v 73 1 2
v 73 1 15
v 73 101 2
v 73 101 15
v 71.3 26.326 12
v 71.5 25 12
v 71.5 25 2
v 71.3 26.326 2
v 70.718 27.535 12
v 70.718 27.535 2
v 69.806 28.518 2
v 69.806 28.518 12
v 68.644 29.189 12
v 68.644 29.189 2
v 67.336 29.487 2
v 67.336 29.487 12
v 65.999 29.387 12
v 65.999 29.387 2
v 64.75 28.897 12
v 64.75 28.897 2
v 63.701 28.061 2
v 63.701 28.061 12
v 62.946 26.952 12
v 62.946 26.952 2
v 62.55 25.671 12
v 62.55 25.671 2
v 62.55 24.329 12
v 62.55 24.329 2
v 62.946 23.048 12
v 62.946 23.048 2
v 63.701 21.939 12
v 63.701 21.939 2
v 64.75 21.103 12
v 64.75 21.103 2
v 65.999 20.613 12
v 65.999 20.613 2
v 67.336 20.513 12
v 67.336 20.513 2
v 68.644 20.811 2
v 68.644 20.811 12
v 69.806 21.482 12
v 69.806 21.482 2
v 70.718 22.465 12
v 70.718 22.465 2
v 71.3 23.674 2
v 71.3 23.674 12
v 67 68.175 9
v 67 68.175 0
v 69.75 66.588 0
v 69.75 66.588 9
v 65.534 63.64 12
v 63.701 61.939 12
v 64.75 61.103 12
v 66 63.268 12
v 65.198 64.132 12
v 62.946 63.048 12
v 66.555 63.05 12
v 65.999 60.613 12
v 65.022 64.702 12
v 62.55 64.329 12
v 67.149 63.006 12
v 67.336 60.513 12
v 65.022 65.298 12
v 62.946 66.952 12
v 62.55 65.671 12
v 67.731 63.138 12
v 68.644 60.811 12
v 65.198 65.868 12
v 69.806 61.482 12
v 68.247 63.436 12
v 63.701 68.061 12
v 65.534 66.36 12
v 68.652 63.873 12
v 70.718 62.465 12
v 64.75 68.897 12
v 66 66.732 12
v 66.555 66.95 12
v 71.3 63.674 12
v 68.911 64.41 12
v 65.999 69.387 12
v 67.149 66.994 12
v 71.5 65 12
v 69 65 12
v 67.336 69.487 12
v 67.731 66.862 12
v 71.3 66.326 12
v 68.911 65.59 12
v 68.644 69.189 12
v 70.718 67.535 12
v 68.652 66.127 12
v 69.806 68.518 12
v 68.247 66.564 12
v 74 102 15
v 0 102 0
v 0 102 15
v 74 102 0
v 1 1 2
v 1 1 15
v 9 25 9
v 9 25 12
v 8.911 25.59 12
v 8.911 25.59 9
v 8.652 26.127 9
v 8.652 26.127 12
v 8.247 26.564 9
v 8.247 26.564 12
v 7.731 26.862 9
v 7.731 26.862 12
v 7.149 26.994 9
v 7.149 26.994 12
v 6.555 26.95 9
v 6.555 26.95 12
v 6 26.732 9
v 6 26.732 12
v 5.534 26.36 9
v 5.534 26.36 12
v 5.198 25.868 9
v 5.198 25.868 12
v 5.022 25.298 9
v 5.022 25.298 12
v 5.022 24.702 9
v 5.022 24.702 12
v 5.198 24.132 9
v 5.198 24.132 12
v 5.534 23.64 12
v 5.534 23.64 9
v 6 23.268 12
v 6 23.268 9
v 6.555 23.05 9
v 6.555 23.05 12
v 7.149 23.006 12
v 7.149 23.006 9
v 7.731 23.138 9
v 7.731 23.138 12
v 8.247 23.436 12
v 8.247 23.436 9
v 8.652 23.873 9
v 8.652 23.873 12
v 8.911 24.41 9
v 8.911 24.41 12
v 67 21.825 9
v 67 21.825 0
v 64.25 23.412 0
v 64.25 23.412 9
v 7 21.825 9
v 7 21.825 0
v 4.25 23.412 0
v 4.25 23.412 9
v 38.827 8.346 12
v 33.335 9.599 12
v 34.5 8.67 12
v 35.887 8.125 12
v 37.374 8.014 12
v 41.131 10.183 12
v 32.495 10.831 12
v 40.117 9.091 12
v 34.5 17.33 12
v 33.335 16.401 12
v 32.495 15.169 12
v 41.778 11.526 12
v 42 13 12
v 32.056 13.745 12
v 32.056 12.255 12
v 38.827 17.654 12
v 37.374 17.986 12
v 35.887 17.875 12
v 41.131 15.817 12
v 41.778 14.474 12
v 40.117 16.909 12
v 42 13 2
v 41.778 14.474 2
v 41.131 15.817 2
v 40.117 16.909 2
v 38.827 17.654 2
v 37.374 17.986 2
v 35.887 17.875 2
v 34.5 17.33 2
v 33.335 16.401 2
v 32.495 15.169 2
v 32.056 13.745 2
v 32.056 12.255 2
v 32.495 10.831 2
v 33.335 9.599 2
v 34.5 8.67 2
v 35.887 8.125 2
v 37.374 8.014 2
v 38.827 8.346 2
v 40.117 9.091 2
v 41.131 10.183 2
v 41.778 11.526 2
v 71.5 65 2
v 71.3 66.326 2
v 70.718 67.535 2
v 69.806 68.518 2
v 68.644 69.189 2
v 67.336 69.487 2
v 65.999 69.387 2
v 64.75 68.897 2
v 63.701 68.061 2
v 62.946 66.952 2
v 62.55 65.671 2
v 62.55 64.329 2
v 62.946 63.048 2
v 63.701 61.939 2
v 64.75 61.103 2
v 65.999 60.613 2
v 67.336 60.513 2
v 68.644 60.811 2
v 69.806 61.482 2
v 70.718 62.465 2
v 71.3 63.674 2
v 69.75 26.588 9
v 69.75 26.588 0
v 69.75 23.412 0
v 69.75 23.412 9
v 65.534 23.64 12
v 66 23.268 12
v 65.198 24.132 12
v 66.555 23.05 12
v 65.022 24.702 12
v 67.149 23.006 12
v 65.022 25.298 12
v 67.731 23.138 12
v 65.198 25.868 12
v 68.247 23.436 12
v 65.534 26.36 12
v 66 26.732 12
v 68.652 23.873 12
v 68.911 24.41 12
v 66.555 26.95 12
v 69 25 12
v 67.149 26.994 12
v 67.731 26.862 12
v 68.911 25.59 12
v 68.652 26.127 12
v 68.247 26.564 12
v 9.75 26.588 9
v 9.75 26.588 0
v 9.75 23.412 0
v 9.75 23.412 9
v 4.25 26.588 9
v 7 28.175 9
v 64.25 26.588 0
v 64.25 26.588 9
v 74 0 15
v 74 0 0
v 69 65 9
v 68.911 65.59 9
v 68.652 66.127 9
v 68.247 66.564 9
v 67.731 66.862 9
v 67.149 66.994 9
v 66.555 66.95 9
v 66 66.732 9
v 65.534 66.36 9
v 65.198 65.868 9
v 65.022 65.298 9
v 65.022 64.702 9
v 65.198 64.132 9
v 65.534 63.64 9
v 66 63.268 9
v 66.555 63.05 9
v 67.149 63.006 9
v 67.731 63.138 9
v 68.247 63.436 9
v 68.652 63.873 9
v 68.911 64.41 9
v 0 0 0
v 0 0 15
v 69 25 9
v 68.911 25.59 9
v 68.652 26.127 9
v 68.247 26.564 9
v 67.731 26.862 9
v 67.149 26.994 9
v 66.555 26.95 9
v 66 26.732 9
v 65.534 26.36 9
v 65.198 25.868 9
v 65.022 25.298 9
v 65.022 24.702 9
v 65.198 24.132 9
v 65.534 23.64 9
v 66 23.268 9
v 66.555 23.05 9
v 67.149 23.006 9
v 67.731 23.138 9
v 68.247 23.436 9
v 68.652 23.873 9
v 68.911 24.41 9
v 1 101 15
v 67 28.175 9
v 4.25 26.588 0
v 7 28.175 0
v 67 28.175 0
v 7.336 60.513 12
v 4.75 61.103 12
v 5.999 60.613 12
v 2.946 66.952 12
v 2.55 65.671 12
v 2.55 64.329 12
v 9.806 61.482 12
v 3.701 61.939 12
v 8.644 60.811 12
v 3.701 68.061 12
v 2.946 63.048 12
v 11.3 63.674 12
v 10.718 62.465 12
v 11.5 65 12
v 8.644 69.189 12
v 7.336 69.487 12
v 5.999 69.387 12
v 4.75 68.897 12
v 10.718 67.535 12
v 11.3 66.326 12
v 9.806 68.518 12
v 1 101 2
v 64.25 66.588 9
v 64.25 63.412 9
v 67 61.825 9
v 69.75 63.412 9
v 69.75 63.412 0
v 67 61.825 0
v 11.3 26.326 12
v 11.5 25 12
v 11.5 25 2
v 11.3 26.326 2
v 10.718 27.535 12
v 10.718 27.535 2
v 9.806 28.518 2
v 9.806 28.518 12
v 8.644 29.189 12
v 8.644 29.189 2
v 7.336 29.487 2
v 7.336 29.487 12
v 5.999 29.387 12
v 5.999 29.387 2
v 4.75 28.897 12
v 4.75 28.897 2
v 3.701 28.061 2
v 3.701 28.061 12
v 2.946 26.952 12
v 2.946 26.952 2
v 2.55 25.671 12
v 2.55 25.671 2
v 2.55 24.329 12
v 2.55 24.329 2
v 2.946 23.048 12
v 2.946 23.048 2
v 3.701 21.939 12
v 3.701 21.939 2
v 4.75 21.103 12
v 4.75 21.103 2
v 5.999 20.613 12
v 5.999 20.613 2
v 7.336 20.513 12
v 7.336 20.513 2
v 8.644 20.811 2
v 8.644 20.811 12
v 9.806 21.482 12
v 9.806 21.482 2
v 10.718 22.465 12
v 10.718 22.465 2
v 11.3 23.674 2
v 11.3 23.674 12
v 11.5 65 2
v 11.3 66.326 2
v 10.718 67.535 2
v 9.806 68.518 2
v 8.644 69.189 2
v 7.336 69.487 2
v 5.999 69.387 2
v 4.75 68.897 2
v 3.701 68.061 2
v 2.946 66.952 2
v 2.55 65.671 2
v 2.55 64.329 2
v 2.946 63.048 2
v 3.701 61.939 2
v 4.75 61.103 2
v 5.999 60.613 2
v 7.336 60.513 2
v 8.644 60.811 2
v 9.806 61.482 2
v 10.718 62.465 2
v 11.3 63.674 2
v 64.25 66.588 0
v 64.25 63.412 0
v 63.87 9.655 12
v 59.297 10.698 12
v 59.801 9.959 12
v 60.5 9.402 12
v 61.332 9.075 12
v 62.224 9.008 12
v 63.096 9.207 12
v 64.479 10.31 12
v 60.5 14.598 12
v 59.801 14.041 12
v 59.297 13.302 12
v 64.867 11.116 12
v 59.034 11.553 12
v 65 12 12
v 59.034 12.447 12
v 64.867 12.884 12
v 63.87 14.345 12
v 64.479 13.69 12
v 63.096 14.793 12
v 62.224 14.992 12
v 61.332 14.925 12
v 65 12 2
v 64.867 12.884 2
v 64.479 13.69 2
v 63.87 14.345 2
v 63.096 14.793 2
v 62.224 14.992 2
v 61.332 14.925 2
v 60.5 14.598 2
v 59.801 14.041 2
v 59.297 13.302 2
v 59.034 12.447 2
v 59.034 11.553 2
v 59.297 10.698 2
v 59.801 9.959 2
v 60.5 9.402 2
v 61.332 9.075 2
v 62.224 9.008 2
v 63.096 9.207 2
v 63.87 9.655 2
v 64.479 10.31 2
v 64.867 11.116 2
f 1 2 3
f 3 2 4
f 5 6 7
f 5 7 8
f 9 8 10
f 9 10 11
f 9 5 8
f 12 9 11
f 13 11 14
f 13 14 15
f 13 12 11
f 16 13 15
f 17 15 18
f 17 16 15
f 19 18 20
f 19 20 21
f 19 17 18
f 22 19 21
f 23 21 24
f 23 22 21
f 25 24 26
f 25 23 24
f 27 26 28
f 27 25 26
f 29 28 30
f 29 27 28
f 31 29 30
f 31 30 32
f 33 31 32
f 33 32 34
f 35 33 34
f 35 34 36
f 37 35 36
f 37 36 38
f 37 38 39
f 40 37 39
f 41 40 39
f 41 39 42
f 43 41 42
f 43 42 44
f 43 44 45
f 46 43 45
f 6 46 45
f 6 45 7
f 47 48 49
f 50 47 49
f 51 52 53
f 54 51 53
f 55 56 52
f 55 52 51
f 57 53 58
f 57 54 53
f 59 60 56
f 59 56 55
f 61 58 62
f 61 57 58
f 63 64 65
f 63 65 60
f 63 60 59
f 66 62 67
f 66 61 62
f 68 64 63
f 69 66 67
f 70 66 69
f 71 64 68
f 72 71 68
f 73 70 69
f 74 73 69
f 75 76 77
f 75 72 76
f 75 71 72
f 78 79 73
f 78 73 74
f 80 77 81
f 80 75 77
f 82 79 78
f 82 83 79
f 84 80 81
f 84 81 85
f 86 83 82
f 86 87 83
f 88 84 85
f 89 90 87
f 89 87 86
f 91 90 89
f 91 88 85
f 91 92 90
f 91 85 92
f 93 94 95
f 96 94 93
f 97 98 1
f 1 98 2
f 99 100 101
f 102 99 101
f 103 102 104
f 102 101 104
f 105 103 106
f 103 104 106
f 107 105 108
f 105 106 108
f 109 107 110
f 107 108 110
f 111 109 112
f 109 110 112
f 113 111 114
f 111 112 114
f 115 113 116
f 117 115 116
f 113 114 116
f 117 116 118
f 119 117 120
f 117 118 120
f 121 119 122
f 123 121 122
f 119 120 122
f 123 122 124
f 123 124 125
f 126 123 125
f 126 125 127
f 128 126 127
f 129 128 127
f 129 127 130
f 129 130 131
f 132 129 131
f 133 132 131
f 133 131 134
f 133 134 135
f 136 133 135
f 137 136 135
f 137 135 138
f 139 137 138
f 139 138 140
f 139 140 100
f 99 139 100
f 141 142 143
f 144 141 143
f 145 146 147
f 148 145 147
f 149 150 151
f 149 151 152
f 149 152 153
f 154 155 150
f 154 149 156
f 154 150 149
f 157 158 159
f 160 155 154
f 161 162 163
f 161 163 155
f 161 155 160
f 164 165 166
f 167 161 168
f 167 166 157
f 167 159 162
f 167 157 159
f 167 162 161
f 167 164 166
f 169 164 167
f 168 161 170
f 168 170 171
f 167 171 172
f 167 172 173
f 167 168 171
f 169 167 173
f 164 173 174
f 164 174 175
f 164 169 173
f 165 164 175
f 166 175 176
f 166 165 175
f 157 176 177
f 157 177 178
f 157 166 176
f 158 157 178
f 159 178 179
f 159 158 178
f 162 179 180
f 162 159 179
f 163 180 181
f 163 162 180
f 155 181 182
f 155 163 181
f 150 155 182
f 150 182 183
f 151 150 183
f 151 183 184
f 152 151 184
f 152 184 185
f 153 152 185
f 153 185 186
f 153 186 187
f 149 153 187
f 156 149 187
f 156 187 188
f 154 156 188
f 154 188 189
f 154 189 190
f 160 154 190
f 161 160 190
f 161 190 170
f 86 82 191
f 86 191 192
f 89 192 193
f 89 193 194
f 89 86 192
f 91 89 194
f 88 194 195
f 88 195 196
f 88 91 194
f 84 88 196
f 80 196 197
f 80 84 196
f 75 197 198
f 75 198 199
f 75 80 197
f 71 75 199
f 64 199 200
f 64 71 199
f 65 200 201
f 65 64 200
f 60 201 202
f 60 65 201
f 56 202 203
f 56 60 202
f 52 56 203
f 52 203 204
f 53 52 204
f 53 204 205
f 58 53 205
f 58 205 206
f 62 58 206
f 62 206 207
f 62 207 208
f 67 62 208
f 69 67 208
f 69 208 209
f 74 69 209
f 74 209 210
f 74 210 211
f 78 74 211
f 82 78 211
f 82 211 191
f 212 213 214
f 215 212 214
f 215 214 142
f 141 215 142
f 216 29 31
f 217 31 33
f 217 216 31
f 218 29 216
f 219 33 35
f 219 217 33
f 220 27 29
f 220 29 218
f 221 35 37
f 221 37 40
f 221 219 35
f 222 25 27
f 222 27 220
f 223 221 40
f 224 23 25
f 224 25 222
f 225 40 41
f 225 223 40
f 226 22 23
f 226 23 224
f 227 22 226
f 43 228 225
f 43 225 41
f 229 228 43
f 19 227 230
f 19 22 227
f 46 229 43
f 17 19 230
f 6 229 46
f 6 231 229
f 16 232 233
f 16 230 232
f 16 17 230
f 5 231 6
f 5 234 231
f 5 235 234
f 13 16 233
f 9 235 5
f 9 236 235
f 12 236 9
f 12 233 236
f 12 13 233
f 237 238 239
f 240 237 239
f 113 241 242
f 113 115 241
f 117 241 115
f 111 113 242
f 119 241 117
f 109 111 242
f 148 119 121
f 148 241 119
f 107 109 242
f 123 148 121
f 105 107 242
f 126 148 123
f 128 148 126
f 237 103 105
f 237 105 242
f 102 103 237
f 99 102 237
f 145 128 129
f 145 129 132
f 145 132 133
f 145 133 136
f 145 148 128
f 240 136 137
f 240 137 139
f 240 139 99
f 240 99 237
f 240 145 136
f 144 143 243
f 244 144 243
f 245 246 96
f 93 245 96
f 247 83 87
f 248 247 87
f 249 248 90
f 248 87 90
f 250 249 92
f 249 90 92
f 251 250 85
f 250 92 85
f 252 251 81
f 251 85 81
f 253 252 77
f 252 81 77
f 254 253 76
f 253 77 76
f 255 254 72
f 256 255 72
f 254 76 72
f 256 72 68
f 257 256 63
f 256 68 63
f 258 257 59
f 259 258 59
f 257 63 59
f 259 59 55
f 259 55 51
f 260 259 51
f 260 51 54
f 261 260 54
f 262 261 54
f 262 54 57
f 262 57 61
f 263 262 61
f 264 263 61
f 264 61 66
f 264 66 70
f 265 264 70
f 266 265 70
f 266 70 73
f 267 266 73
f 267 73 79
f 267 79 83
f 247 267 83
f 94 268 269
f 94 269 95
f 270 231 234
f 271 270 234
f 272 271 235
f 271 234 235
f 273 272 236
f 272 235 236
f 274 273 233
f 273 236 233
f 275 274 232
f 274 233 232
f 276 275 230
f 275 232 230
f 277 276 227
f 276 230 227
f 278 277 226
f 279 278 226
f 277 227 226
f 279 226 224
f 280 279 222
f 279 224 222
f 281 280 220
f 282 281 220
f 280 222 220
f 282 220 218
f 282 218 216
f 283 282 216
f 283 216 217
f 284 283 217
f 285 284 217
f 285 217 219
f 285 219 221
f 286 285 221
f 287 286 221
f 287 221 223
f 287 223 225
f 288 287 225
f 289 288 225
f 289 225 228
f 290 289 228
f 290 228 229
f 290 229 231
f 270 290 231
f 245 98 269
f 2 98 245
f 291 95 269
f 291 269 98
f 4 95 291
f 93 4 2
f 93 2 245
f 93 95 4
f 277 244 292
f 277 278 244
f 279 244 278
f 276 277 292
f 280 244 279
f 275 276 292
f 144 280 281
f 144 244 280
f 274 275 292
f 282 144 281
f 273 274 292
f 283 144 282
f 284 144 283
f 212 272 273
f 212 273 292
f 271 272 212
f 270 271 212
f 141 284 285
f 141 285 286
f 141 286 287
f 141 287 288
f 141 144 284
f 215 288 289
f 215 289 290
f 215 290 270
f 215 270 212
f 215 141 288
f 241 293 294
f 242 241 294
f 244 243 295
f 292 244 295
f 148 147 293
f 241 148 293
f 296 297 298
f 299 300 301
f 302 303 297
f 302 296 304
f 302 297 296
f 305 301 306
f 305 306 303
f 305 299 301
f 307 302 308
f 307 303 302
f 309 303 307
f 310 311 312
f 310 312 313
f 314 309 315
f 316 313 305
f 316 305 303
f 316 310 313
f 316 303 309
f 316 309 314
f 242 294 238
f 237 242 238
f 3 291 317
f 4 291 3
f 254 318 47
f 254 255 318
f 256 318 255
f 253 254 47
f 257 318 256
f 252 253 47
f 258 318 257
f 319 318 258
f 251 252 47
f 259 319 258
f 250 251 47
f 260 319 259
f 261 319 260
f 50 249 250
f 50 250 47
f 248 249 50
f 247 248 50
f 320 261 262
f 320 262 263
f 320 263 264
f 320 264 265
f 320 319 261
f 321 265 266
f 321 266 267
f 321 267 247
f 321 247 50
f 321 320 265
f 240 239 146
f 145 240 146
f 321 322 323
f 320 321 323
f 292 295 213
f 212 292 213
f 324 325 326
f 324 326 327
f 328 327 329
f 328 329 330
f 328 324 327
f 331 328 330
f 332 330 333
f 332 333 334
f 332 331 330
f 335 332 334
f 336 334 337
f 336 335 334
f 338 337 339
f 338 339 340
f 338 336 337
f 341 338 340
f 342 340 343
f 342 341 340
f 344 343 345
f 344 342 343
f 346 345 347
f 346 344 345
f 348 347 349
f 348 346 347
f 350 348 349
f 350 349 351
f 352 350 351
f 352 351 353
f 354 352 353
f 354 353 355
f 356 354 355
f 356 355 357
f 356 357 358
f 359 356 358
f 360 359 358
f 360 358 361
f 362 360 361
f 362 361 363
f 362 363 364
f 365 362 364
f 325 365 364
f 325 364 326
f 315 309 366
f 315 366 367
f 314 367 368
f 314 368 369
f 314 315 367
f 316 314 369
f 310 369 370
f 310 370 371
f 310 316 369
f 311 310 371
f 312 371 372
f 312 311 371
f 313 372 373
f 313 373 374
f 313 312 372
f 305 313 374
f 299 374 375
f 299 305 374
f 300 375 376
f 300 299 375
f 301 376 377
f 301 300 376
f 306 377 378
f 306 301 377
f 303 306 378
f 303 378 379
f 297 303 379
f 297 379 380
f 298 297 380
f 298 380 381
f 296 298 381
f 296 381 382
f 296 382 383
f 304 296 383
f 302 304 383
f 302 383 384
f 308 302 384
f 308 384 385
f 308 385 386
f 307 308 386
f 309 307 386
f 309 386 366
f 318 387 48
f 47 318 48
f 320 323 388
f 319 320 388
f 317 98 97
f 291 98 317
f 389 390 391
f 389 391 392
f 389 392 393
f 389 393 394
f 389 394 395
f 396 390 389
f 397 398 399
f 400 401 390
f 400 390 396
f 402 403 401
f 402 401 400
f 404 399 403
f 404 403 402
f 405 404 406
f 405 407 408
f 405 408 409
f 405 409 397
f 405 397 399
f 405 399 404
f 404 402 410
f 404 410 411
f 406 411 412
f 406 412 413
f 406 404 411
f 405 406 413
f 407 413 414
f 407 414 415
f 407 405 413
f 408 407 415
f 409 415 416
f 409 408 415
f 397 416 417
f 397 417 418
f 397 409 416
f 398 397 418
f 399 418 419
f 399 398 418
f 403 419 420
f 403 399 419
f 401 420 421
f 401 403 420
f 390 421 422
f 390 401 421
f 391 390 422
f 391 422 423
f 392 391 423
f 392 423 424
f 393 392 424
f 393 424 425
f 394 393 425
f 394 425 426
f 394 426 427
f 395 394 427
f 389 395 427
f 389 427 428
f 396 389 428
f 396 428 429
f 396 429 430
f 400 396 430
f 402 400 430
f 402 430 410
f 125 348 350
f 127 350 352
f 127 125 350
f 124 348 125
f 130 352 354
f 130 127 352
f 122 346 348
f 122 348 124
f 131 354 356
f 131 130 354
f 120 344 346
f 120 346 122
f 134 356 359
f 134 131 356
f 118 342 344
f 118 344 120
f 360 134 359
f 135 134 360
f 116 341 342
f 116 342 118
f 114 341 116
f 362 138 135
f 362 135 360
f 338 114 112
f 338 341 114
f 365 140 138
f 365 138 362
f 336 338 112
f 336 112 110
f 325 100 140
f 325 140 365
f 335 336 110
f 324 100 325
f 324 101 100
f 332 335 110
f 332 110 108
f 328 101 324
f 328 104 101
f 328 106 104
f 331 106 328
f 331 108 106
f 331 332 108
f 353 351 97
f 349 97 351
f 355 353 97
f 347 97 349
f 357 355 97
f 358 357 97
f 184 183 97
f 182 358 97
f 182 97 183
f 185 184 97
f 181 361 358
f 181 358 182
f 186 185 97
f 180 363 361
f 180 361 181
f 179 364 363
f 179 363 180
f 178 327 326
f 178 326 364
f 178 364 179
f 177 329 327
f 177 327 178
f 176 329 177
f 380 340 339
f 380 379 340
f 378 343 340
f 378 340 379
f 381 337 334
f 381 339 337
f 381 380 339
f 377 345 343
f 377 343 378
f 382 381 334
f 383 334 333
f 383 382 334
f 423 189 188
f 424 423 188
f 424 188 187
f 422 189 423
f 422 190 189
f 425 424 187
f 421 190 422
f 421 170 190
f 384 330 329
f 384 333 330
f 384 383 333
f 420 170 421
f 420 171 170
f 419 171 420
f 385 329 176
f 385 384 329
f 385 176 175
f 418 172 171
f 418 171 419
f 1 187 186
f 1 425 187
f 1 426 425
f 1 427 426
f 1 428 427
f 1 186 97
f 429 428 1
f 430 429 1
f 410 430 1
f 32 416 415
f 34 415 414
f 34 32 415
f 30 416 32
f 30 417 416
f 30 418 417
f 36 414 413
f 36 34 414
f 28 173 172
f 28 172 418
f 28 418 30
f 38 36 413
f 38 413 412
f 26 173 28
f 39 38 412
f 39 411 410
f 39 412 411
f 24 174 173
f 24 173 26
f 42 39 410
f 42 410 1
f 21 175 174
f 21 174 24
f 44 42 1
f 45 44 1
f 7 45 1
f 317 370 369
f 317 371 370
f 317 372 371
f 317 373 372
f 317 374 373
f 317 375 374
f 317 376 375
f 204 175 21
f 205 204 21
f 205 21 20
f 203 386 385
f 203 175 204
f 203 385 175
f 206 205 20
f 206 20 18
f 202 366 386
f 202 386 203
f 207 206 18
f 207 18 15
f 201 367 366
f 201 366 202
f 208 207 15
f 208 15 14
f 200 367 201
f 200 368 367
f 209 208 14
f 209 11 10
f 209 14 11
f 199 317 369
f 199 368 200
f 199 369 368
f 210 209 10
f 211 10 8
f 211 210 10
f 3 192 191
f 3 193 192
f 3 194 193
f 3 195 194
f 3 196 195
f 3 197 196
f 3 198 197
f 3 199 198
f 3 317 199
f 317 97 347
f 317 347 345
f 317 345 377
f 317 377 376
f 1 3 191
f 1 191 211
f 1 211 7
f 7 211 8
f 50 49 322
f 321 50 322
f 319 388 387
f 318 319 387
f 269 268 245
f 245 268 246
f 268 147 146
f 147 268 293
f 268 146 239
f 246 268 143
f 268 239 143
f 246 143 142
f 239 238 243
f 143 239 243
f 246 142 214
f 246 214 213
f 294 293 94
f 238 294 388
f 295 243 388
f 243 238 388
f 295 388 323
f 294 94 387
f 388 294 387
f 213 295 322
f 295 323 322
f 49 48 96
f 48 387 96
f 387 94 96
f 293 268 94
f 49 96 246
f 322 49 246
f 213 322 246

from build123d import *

# Parameters (mm, degrees)
SKETCH_W        = 74
SKETCH_H        = 102
PAD_DEPTH       = 15
SKETCH001_W     = 72
SKETCH001_H     = 100
SKETCH001_R     = 4.5
SKETCH001_R_2   = 5
SKETCH001_R_3   = 3
POCKET_DEPTH    = 13
SKETCH002_R     = 2
POCKET001_DEPTH = 15.001
POCKET002_DEPTH = 9
SKETCH004_W     = 72
SKETCH004_H     = 100
POCKET003_DEPTH = 3


with BuildPart() as part:
    # Sketch → Pad (new body)
    with BuildSketch(Plane.XY):
        with Locations((37, 51)):
            Rectangle(SKETCH_W, SKETCH_H)
    extrude(amount=PAD_DEPTH)

    # Sketch001 (on Face6 of Pad) → Pocket (cut)
    with BuildSketch(Plane.XY.offset(15)):
        with Locations((37, 51)):
            Rectangle(SKETCH001_W, SKETCH001_H)
        with Locations((67, 25)):
            Circle(SKETCH001_R, mode=Mode.SUBTRACT)
        with Locations((7, 25)):
            Circle(SKETCH001_R, mode=Mode.SUBTRACT)
        with Locations((7, 65)):
            Circle(SKETCH001_R, mode=Mode.SUBTRACT)
        with Locations((67, 65)):
            Circle(SKETCH001_R, mode=Mode.SUBTRACT)
        with Locations((37, 13)):
            Circle(SKETCH001_R_2, mode=Mode.SUBTRACT)
        with Locations((62, 12)):
            Circle(SKETCH001_R_3, mode=Mode.SUBTRACT)
    extrude(amount=-POCKET_DEPTH, mode=Mode.SUBTRACT)

    # Sketch002 (on Face20 of Pocket) → Pocket001 (cut, through all)
    with BuildSketch(Plane.XY.offset(15)):
        with Locations((67, 65)):
            Circle(SKETCH002_R)
        with Locations((67, 25)):
            Circle(SKETCH002_R)
        with Locations((7, 25)):
            Circle(SKETCH002_R)
    extrude(amount=-POCKET001_DEPTH, mode=Mode.SUBTRACT)

    # Sketch003 (on Face4 of Pocket001) → Pocket002 (cut)
    with BuildSketch(Plane(origin=(0, 0, 0), x_dir=(1, 0, 0), z_dir=(0, 0, -1))):
        Polygon((9.75, -26.587713), (9.75, -23.412287), (7, -21.824574), (4.25, -23.412287), (4.25, -26.587713), (7, -28.175426), align=None)
        Polygon((69.75, -26.587713), (69.75, -23.412287), (67, -21.824574), (64.25, -23.412287), (64.25, -26.587713), (67, -28.175426), align=None)
        Polygon((69.75, -66.587713), (69.75, -63.412287), (67, -61.824574), (64.25, -63.412287), (64.25, -66.587713), (67, -68.175426), align=None)
    extrude(amount=-POCKET002_DEPTH, mode=Mode.SUBTRACT)

    # Sketch004 (on Face5 of Pocket002) → Pocket003 (cut)
    with BuildSketch(Plane.XY.offset(15)):
        with Locations((37, 51)):
            Rectangle(SKETCH004_W, SKETCH004_H)
    extrude(amount=-POCKET003_DEPTH, mode=Mode.SUBTRACT)


solid = part.part
